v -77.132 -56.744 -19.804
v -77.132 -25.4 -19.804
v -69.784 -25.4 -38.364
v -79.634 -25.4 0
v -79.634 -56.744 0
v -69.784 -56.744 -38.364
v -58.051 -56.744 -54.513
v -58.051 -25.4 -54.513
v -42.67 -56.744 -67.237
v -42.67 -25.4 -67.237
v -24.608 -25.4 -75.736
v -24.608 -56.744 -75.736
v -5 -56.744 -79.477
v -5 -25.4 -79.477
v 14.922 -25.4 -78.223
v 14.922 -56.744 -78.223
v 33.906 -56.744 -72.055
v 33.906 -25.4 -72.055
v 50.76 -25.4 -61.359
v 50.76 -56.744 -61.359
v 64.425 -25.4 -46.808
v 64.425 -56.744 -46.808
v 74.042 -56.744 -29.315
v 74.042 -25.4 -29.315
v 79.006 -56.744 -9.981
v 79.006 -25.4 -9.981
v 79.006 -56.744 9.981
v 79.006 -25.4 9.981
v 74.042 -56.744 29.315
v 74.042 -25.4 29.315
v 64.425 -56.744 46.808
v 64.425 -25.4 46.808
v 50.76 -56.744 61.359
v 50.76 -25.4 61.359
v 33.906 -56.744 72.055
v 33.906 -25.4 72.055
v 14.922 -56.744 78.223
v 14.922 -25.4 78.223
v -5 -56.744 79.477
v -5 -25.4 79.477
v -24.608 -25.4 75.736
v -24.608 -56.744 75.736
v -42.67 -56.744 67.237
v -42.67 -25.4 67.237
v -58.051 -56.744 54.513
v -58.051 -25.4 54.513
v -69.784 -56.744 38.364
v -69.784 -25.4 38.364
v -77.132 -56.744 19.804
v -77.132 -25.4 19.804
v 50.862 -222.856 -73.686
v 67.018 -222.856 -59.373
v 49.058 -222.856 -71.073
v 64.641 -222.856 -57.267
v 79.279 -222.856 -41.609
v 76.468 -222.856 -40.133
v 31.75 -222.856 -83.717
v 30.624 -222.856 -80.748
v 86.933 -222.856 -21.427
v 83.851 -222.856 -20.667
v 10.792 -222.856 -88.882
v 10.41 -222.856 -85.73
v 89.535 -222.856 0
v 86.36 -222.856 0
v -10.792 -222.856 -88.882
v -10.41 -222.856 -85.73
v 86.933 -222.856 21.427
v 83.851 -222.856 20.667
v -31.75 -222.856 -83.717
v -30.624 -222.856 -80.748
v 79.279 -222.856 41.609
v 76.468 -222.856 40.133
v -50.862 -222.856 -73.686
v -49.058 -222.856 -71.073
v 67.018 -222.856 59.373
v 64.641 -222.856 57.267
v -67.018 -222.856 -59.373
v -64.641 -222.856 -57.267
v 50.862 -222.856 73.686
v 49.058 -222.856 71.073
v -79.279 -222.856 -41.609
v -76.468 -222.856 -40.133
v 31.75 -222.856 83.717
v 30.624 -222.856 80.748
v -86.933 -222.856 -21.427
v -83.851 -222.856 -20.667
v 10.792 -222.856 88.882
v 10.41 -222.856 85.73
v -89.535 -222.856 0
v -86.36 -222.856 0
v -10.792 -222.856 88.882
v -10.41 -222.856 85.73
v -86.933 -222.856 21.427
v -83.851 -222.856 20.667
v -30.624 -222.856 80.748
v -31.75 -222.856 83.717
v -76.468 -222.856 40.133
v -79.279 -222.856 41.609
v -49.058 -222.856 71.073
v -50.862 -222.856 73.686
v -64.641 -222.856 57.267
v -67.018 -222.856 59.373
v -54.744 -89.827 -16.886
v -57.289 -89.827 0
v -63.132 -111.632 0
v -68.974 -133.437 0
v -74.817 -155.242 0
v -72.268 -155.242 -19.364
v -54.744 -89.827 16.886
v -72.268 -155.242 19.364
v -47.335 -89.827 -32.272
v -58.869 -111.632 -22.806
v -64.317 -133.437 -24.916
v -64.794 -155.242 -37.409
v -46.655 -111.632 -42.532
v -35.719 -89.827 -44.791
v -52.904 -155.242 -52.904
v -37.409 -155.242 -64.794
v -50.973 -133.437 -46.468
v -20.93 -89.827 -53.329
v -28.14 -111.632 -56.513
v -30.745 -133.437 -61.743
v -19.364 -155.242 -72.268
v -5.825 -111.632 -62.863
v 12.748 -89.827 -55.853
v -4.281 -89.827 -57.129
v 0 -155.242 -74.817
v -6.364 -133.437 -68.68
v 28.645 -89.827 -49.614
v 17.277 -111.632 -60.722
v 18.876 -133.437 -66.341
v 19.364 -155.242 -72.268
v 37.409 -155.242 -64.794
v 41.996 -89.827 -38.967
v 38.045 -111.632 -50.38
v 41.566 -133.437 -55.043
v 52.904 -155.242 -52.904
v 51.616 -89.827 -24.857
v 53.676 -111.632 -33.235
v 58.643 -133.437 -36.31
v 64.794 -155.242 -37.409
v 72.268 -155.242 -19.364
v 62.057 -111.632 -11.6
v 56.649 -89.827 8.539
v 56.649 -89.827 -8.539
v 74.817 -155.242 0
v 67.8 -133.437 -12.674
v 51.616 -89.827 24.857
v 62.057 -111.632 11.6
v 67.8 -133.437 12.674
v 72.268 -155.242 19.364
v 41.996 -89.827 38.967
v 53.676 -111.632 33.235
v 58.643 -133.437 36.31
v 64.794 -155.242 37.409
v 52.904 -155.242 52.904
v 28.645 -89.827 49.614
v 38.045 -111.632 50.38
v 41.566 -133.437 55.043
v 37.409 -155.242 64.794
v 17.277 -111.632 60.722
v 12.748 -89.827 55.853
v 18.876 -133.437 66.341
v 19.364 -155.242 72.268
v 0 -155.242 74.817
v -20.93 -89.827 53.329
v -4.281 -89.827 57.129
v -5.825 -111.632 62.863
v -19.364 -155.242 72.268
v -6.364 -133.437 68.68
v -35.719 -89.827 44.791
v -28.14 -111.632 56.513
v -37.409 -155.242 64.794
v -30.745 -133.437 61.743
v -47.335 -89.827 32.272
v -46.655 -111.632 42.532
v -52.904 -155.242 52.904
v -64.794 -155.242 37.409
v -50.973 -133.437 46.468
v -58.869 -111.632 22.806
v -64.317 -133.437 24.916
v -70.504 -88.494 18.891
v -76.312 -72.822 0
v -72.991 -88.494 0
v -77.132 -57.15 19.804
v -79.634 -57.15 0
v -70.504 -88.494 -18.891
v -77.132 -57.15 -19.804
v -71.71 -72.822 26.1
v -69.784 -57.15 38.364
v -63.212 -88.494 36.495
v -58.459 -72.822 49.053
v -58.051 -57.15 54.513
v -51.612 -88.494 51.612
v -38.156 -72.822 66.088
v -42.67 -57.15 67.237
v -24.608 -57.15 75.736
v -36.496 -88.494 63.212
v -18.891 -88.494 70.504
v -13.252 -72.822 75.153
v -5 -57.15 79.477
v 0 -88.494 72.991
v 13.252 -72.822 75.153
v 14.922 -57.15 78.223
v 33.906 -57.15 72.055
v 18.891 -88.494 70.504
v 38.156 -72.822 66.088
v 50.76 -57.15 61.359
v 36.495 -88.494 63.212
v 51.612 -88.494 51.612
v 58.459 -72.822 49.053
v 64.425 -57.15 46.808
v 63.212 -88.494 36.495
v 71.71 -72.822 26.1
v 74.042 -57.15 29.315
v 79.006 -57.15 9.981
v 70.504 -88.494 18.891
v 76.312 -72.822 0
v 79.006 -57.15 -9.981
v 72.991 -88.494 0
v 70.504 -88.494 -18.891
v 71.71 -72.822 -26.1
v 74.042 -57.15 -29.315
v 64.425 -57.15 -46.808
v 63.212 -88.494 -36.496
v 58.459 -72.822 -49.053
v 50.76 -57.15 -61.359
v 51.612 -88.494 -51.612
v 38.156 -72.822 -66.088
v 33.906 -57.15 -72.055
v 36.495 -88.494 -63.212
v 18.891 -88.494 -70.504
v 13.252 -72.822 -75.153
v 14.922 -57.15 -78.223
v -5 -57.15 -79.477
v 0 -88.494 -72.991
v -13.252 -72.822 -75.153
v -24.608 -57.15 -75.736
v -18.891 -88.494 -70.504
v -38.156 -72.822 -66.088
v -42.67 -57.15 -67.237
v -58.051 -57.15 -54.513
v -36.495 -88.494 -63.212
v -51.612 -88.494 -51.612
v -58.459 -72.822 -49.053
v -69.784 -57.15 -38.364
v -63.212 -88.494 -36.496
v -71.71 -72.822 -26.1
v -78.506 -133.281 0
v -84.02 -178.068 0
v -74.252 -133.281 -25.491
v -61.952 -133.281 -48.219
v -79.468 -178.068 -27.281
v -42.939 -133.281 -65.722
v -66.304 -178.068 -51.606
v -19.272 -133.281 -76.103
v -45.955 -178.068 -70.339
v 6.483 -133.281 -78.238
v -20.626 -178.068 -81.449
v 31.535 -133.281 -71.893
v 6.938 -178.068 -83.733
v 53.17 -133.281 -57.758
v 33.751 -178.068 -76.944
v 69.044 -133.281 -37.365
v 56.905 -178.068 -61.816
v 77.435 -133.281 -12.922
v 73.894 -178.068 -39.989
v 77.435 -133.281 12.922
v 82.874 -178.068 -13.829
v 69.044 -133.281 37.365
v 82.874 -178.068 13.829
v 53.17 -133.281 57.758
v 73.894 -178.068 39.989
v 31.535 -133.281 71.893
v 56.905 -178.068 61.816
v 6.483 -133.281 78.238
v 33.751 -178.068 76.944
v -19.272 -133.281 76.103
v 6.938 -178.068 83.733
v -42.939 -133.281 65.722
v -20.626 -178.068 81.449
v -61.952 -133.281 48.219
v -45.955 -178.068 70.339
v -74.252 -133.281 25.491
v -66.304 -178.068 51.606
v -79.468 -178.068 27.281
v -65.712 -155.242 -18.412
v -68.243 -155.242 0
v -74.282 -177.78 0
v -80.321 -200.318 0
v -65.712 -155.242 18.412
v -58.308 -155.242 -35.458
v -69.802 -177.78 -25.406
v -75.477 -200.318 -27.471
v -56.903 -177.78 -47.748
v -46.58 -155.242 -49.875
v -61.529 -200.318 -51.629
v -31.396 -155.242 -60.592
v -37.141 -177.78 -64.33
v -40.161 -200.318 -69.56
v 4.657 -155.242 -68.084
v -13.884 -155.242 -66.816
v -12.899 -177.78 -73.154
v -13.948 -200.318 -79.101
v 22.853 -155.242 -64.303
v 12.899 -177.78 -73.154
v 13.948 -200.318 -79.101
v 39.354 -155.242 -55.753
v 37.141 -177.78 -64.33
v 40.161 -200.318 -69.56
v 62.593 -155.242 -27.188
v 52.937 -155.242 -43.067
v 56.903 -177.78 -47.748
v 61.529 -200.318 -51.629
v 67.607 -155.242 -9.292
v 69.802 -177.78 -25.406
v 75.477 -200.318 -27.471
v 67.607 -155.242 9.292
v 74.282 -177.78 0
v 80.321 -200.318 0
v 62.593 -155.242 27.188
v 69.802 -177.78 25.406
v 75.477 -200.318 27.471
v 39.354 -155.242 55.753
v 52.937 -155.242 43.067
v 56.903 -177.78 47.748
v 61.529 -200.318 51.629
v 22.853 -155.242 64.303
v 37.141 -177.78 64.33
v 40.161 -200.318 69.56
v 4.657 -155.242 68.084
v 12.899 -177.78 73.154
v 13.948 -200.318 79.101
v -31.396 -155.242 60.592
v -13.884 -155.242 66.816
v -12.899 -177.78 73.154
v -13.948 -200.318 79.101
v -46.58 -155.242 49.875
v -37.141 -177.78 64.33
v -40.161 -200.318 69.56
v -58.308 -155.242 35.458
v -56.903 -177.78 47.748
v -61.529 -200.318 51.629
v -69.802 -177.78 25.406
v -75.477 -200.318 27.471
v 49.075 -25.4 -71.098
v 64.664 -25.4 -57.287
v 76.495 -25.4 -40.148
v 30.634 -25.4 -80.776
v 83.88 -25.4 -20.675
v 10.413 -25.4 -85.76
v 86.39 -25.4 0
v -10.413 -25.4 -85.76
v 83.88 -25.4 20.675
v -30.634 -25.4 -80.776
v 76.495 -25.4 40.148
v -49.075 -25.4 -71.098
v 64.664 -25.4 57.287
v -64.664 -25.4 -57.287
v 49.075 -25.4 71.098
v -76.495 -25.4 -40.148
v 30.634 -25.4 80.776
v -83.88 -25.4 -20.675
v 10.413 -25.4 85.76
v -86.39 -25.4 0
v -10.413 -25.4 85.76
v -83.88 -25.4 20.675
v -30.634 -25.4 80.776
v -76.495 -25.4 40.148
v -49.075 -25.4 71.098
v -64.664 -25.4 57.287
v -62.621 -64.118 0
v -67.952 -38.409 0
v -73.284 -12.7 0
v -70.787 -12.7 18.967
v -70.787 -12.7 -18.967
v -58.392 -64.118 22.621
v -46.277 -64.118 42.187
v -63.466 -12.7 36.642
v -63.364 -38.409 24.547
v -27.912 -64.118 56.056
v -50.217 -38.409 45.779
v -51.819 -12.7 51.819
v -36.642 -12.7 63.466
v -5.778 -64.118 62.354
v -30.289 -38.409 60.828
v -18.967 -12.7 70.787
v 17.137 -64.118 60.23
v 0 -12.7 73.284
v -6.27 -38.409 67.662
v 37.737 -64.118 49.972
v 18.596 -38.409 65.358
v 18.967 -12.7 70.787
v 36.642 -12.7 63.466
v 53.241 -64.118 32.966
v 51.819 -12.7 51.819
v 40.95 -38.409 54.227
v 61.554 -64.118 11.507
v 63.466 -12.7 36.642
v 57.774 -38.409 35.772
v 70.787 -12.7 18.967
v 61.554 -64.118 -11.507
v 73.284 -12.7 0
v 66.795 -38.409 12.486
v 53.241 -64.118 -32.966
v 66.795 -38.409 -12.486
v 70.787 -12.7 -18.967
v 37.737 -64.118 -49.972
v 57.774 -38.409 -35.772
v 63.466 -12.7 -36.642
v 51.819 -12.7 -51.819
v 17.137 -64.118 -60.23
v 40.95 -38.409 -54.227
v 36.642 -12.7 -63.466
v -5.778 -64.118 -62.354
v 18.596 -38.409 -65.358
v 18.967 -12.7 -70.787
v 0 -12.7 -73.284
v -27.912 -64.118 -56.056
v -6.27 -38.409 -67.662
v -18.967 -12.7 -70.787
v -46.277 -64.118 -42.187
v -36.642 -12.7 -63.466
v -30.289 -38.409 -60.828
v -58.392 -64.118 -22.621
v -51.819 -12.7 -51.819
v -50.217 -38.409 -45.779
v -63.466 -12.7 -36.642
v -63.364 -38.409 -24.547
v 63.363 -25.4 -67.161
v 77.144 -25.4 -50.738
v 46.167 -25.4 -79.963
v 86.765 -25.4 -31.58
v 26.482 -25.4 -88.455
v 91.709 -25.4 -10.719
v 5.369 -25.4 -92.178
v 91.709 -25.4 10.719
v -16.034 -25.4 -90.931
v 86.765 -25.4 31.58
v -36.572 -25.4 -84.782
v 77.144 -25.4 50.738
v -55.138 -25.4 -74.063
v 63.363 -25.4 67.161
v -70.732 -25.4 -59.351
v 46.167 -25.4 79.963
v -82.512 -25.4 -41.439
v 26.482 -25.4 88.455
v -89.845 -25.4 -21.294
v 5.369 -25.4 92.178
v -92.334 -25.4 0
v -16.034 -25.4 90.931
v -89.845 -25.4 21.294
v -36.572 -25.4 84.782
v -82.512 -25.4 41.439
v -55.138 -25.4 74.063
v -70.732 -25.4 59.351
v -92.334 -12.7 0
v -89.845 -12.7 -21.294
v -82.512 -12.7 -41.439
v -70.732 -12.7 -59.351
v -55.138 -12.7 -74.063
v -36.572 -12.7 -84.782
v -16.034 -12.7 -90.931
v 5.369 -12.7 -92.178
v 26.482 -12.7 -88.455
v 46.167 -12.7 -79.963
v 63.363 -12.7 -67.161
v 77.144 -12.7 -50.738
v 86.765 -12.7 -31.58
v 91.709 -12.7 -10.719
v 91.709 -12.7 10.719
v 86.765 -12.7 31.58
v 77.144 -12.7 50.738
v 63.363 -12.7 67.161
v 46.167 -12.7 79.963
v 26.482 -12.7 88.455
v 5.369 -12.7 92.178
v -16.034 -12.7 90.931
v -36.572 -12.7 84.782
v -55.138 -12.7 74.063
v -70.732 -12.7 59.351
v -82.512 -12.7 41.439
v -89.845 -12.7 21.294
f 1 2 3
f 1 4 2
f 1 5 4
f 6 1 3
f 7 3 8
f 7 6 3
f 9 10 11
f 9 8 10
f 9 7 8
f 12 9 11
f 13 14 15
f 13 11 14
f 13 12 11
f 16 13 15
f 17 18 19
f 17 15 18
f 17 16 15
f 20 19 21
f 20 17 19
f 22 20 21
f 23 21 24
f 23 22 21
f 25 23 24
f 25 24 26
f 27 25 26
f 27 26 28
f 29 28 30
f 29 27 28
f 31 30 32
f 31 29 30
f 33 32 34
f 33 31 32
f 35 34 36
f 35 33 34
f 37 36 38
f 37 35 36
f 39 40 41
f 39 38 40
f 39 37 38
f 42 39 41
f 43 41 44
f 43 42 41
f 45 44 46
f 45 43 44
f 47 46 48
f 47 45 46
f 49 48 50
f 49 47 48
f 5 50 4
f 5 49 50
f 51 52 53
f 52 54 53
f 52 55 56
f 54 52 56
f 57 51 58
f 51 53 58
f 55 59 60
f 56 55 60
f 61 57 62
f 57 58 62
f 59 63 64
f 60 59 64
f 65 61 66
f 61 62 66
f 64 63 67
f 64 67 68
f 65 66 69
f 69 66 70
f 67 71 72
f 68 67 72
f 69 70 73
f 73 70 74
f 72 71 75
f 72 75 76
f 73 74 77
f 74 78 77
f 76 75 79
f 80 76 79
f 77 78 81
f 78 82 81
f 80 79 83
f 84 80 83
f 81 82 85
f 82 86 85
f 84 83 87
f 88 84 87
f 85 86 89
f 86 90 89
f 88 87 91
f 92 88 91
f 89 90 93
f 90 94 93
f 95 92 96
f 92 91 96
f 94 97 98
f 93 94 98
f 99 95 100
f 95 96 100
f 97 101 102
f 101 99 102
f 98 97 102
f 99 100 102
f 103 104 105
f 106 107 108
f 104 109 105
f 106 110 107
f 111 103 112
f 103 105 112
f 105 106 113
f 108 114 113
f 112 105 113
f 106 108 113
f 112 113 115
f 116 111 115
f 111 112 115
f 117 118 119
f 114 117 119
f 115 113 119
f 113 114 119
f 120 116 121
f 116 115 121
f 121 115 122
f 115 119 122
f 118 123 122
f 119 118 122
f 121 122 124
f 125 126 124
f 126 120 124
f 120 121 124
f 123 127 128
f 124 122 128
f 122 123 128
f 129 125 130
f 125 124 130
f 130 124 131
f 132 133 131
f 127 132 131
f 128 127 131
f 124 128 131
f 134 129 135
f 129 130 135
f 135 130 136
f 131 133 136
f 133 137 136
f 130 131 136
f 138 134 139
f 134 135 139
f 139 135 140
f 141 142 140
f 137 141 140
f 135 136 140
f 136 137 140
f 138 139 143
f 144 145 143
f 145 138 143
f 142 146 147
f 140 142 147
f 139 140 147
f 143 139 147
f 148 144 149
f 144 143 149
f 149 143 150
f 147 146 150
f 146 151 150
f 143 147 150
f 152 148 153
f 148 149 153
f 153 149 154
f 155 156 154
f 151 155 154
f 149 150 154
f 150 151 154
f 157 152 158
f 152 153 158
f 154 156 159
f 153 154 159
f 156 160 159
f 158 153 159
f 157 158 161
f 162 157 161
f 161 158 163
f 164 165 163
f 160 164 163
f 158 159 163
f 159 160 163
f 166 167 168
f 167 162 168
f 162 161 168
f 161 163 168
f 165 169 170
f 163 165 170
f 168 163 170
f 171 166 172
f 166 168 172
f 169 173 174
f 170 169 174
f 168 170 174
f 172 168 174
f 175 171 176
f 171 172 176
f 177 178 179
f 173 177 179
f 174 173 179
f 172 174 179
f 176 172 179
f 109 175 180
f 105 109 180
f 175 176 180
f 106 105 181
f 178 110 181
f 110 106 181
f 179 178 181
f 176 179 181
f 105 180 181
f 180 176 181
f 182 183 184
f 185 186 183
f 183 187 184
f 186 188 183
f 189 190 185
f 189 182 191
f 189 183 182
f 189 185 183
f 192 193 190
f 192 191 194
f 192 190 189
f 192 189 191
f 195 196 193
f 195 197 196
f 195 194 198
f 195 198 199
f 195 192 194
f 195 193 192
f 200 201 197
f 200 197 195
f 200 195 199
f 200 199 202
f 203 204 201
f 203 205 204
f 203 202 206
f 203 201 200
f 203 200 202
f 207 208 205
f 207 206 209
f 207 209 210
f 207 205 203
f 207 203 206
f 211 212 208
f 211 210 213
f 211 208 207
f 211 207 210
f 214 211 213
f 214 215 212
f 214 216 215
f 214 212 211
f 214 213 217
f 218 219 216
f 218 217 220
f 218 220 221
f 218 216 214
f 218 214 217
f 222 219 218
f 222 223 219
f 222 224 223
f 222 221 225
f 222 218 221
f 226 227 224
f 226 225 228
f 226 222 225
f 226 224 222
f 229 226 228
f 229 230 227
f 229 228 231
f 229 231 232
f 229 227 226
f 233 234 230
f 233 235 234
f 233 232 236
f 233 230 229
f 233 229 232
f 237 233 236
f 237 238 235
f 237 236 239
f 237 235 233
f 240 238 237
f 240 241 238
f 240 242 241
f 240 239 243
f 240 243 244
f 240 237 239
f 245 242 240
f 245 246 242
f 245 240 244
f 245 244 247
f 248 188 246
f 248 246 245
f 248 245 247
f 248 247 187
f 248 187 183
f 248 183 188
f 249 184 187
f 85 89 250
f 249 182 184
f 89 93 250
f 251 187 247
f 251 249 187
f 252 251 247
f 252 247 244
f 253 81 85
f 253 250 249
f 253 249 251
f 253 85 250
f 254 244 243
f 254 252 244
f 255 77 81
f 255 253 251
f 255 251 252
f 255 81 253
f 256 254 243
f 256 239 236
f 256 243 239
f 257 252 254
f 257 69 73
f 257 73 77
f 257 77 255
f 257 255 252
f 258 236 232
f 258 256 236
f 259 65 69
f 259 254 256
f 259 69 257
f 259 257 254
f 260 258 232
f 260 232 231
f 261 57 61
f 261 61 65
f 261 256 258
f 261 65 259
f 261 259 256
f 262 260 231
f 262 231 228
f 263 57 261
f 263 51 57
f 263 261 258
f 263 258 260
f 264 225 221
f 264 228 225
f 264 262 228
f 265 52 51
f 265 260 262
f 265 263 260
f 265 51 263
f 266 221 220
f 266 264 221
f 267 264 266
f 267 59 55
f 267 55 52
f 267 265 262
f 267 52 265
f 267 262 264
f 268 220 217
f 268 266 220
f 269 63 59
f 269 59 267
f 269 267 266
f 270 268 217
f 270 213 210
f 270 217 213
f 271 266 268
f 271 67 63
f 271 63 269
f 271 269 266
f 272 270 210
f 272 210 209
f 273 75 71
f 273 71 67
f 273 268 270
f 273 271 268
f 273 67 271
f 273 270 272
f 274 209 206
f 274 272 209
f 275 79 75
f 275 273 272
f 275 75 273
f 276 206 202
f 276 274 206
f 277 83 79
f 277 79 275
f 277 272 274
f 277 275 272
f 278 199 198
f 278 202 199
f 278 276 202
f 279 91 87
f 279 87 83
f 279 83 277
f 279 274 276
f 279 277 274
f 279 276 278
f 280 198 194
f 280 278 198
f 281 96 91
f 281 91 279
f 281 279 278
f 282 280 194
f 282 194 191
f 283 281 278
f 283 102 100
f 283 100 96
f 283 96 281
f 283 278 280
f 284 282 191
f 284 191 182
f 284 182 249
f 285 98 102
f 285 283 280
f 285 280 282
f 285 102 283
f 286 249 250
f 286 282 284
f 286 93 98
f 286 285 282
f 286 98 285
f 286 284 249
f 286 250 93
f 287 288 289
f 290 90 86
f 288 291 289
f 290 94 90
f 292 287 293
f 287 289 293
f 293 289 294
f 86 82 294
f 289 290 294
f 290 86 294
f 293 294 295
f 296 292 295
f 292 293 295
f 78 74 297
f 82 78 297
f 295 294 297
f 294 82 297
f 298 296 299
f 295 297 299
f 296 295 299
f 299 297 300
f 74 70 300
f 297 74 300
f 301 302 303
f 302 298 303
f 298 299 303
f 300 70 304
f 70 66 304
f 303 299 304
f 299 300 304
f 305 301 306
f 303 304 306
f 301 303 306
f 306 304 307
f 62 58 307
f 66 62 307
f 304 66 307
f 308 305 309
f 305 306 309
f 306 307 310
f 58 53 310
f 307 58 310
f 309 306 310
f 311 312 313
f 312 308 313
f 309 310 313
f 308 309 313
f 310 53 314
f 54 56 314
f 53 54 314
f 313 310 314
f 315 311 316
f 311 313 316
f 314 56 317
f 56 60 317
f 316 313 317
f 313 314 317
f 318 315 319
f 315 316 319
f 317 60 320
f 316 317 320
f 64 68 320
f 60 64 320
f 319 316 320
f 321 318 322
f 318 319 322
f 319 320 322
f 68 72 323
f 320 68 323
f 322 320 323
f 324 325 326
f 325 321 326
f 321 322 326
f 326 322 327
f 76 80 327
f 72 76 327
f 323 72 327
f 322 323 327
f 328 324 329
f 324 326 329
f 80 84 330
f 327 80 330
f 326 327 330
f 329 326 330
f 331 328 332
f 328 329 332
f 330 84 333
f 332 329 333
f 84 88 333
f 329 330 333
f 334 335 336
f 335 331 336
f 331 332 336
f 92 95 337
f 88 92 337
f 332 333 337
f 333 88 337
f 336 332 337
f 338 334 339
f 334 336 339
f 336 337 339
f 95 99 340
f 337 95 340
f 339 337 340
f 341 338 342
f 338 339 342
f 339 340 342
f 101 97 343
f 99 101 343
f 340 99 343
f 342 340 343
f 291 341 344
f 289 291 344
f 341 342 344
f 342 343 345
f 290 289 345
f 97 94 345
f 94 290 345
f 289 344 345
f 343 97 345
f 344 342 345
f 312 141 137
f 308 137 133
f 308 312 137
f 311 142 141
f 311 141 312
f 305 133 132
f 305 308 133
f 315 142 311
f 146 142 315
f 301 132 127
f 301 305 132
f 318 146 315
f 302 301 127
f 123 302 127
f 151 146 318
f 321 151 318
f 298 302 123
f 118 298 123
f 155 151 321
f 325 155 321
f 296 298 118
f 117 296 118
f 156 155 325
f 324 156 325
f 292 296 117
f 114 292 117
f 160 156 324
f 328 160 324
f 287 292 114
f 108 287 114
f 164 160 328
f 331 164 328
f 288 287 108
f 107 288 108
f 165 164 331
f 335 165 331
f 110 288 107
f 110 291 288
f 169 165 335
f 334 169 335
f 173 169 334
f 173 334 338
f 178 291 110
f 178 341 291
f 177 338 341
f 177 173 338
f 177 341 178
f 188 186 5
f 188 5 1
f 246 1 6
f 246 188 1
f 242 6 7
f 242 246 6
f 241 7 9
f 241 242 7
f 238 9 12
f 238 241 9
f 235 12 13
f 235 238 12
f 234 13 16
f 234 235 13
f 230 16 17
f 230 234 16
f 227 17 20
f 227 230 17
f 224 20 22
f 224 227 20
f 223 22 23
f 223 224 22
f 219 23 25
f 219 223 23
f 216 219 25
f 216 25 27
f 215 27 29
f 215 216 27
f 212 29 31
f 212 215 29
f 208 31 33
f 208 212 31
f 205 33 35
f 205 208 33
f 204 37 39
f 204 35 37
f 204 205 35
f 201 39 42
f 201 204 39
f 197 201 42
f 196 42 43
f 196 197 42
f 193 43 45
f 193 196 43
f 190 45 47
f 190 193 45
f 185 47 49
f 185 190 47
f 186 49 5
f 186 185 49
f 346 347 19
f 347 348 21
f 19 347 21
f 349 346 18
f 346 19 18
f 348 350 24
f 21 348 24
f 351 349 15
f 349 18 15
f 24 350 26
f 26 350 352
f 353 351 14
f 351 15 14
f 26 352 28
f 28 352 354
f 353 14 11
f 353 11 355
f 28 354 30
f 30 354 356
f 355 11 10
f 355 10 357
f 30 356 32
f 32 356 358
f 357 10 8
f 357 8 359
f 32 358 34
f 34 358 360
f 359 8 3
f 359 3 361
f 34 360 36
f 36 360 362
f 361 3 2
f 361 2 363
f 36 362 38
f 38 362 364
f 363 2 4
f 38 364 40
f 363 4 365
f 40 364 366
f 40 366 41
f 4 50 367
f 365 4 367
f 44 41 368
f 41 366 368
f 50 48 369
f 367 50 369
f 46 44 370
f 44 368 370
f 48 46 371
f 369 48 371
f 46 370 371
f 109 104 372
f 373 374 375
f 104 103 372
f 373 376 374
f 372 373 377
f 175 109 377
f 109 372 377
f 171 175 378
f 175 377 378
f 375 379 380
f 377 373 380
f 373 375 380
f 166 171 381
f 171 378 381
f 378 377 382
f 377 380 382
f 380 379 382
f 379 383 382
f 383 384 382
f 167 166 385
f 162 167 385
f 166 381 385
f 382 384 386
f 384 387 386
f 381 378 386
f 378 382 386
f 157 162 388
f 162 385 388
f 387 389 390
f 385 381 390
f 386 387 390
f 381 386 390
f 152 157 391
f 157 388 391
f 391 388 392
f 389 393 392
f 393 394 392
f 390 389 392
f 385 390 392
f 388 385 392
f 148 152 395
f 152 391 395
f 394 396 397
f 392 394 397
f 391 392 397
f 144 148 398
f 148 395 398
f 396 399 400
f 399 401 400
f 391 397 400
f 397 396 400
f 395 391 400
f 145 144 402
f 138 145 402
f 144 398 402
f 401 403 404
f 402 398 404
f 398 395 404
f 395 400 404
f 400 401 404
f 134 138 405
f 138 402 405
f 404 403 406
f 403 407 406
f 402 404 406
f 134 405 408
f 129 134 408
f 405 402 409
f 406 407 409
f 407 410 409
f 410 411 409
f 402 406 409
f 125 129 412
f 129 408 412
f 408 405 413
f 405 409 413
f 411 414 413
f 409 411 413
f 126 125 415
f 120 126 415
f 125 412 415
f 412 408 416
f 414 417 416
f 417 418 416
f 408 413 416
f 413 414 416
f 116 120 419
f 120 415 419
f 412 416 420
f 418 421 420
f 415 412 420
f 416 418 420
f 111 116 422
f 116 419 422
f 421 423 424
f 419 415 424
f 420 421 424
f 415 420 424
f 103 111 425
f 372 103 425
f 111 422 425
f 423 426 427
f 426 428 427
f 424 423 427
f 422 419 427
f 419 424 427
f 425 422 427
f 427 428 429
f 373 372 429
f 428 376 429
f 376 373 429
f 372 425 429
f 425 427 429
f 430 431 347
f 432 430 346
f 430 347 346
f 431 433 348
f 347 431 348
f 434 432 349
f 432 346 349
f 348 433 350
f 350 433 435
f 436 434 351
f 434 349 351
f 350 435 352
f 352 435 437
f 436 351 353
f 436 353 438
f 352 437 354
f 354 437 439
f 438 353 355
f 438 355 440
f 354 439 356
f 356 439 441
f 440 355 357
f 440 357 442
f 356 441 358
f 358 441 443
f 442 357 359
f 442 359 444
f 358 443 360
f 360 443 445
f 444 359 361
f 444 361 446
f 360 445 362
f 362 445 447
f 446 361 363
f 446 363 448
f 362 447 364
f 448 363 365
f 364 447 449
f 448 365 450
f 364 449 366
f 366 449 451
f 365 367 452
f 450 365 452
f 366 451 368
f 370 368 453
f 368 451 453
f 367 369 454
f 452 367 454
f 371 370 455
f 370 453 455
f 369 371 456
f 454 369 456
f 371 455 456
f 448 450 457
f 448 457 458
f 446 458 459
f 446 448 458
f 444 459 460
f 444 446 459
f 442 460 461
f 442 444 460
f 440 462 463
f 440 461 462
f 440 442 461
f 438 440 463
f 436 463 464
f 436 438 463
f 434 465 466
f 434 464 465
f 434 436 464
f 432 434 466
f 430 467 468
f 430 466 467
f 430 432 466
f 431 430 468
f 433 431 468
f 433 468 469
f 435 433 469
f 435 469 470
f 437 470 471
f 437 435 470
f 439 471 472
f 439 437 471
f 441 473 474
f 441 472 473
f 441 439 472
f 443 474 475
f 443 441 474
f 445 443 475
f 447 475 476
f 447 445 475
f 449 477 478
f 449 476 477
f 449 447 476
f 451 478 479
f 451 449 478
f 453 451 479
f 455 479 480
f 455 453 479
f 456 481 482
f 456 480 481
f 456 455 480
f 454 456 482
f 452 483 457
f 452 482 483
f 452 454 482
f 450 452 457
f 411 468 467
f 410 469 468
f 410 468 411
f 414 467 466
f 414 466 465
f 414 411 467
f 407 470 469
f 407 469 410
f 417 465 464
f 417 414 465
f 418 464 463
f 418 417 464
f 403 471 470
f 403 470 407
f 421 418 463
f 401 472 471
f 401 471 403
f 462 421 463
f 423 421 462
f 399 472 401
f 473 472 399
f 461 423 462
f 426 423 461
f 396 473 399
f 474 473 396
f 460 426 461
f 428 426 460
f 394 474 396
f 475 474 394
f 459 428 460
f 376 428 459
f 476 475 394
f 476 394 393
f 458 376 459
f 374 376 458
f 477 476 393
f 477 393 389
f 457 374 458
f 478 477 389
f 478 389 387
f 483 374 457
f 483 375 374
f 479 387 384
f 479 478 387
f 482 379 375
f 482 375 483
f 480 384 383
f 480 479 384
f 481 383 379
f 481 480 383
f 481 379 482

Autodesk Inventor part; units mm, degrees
ref_plane "YZ Plane" through (0, 0, 0) normal (1, 0, 0) x (0, 1, 0)
ref_plane "XZ Plane" through (0, 0, 0) normal (0, 1, 0) x (-1, 0, 0)
ref_plane "XY Plane" through (0, 0, 0) normal (0, 0, 1) x (1, 0, 0)
sketch "Sketch1" plane through (0, 0, 0) normal (0, 0, 1) x (1, 0, 0)
  line L0 (0, 25.4) -> (-28.702, 25.4) construction
  line L1 (0, 25.4) -> (-95.25, 25.4) construction
  line L2 (-95.25, 25.4) -> (-89.1588, 25.4) construction
  line L3 (-89.1588, 25.4) -> (-85.693, 23.7839) construction
  line L4 (-89.1588, 25.4) -> (-89.1588, 21.1626) construction
  line L5 (-89.1588, 0) -> (-95.25, 0)
  line L6 (-28.702, 59.6457) -> (-28.702, -91.9304) construction
  arc A0 (-28.9184, -8.4804) -> (-32.3684, -1.0818) centre (-35.052, -6.8369) ccw
  line L7 (-89.1588, 25.4) -> (-89.1588, 0)
  line L8 (-89.1588, 25.4) -> (-32.3684, -1.0818)
  line L9 (-28.9184, -8.4804) -> (-28.9392, -8.5583)
  line L10 (0, -319.0244) -> (0, 122.7573) projected
  line L11 (-73.152, 17.9359) -> (-28.702, 17.9359) construction
  line L12 (-89.1588, 0) -> (-92.3338, 0)
  line L13 (11.4547, -6.8369) -> (-136.2084, -6.8369) construction
  line L14 (-57.2892, -89.8271) -> (-74.8171, -155.2422)
  line L15 (-92.3338, -12.7) -> (-73.2838, -12.7)
  line L16 (-73.2838, -12.7) -> (-54.421, -103.6575)
  line L17 (-74.8171, -155.2422) -> (-68.2431, -155.2422)
  line L18 (-92.3338, -25.4) -> (-79.6338, -25.4)
  line L19 (-79.6338, -25.4) -> (-79.6338, -57.15)
  line L20 (-79.6338, -57.15) -> (-72.991, -88.4936)
  line L21 (-92.3338, 0) -> (-92.3338, -25.4)
  line L22 (-86.3902, -25.4) -> (-86.3902, -31.3436)
  line L23 (-86.3902, -31.3436) -> (-92.3338, -31.3436)
  line L24 (-92.3338, -31.3436) -> (-92.3338, -56.7436)
  line L25 (-92.3338, -56.7436) -> (-79.6338, -56.7436)
  line L26 (-73.152, 17.9359) -> (-32.3684, -1.0818)
  line L27 (-73.152, 17.9359) -> (-50.7653, -90.0141)
  line L28 (-50.7653, -90.0141) -> (-28.9184, -8.4804)
  line L29 (-52.4654, -96.3589) -> (-28.9184, -8.4804)
  line L30 (-86.36, -222.8555) -> (-28.9184, -8.4804)
  line L31 (-72.991, -88.4936) -> (-89.535, -222.8555)
  line L32 (-89.535, -222.8555) -> (-86.36, -222.8555)
  point P0 (0, 0)
  point P1 (-95.25, -255.9127)
  point P2 (-88.7095, 22.4389)
  dimension "d0" = 28.702
  dimension "d3" = 25
  dimension "d5" = 25.4
  dimension "d6" = 25.4
  dimension "d8" = 12.7
  dimension "d34" = 15
  dimension "d37" = 44.45
  dimension "d46" = 19.05
  dimension "d47" = 12.7
  dimension "d55" = 12.7
  dimension "d56" = 31.75
  dimension "d58" = 0.25
  dimension "d60" = 12.7
  dimension "d61" = 25.4
  dimension "d62" = 5.9436
  dimension "d63" = 5.9436
  dimension "d64" = 3.175
  dimension "d68" = 107.95
  dimension "d69" = 6.35
  dimension "d70" = 6.35
  dimension "d71" = 3.175
  dimension "d73" = 86.36
  dimension "d74" = 31.75
  dimension "d75" = 6.3448
revolve "Revolution3" add sketch "Sketch1" angle 360 about axis through (0, -10, 0) along (0, 1, 0) contours L15 L16 L14 L17 L30 L32 L31 L20 L19 L18 L21
properties part number "aluminum_carrier" material "Aluminum 6061"
